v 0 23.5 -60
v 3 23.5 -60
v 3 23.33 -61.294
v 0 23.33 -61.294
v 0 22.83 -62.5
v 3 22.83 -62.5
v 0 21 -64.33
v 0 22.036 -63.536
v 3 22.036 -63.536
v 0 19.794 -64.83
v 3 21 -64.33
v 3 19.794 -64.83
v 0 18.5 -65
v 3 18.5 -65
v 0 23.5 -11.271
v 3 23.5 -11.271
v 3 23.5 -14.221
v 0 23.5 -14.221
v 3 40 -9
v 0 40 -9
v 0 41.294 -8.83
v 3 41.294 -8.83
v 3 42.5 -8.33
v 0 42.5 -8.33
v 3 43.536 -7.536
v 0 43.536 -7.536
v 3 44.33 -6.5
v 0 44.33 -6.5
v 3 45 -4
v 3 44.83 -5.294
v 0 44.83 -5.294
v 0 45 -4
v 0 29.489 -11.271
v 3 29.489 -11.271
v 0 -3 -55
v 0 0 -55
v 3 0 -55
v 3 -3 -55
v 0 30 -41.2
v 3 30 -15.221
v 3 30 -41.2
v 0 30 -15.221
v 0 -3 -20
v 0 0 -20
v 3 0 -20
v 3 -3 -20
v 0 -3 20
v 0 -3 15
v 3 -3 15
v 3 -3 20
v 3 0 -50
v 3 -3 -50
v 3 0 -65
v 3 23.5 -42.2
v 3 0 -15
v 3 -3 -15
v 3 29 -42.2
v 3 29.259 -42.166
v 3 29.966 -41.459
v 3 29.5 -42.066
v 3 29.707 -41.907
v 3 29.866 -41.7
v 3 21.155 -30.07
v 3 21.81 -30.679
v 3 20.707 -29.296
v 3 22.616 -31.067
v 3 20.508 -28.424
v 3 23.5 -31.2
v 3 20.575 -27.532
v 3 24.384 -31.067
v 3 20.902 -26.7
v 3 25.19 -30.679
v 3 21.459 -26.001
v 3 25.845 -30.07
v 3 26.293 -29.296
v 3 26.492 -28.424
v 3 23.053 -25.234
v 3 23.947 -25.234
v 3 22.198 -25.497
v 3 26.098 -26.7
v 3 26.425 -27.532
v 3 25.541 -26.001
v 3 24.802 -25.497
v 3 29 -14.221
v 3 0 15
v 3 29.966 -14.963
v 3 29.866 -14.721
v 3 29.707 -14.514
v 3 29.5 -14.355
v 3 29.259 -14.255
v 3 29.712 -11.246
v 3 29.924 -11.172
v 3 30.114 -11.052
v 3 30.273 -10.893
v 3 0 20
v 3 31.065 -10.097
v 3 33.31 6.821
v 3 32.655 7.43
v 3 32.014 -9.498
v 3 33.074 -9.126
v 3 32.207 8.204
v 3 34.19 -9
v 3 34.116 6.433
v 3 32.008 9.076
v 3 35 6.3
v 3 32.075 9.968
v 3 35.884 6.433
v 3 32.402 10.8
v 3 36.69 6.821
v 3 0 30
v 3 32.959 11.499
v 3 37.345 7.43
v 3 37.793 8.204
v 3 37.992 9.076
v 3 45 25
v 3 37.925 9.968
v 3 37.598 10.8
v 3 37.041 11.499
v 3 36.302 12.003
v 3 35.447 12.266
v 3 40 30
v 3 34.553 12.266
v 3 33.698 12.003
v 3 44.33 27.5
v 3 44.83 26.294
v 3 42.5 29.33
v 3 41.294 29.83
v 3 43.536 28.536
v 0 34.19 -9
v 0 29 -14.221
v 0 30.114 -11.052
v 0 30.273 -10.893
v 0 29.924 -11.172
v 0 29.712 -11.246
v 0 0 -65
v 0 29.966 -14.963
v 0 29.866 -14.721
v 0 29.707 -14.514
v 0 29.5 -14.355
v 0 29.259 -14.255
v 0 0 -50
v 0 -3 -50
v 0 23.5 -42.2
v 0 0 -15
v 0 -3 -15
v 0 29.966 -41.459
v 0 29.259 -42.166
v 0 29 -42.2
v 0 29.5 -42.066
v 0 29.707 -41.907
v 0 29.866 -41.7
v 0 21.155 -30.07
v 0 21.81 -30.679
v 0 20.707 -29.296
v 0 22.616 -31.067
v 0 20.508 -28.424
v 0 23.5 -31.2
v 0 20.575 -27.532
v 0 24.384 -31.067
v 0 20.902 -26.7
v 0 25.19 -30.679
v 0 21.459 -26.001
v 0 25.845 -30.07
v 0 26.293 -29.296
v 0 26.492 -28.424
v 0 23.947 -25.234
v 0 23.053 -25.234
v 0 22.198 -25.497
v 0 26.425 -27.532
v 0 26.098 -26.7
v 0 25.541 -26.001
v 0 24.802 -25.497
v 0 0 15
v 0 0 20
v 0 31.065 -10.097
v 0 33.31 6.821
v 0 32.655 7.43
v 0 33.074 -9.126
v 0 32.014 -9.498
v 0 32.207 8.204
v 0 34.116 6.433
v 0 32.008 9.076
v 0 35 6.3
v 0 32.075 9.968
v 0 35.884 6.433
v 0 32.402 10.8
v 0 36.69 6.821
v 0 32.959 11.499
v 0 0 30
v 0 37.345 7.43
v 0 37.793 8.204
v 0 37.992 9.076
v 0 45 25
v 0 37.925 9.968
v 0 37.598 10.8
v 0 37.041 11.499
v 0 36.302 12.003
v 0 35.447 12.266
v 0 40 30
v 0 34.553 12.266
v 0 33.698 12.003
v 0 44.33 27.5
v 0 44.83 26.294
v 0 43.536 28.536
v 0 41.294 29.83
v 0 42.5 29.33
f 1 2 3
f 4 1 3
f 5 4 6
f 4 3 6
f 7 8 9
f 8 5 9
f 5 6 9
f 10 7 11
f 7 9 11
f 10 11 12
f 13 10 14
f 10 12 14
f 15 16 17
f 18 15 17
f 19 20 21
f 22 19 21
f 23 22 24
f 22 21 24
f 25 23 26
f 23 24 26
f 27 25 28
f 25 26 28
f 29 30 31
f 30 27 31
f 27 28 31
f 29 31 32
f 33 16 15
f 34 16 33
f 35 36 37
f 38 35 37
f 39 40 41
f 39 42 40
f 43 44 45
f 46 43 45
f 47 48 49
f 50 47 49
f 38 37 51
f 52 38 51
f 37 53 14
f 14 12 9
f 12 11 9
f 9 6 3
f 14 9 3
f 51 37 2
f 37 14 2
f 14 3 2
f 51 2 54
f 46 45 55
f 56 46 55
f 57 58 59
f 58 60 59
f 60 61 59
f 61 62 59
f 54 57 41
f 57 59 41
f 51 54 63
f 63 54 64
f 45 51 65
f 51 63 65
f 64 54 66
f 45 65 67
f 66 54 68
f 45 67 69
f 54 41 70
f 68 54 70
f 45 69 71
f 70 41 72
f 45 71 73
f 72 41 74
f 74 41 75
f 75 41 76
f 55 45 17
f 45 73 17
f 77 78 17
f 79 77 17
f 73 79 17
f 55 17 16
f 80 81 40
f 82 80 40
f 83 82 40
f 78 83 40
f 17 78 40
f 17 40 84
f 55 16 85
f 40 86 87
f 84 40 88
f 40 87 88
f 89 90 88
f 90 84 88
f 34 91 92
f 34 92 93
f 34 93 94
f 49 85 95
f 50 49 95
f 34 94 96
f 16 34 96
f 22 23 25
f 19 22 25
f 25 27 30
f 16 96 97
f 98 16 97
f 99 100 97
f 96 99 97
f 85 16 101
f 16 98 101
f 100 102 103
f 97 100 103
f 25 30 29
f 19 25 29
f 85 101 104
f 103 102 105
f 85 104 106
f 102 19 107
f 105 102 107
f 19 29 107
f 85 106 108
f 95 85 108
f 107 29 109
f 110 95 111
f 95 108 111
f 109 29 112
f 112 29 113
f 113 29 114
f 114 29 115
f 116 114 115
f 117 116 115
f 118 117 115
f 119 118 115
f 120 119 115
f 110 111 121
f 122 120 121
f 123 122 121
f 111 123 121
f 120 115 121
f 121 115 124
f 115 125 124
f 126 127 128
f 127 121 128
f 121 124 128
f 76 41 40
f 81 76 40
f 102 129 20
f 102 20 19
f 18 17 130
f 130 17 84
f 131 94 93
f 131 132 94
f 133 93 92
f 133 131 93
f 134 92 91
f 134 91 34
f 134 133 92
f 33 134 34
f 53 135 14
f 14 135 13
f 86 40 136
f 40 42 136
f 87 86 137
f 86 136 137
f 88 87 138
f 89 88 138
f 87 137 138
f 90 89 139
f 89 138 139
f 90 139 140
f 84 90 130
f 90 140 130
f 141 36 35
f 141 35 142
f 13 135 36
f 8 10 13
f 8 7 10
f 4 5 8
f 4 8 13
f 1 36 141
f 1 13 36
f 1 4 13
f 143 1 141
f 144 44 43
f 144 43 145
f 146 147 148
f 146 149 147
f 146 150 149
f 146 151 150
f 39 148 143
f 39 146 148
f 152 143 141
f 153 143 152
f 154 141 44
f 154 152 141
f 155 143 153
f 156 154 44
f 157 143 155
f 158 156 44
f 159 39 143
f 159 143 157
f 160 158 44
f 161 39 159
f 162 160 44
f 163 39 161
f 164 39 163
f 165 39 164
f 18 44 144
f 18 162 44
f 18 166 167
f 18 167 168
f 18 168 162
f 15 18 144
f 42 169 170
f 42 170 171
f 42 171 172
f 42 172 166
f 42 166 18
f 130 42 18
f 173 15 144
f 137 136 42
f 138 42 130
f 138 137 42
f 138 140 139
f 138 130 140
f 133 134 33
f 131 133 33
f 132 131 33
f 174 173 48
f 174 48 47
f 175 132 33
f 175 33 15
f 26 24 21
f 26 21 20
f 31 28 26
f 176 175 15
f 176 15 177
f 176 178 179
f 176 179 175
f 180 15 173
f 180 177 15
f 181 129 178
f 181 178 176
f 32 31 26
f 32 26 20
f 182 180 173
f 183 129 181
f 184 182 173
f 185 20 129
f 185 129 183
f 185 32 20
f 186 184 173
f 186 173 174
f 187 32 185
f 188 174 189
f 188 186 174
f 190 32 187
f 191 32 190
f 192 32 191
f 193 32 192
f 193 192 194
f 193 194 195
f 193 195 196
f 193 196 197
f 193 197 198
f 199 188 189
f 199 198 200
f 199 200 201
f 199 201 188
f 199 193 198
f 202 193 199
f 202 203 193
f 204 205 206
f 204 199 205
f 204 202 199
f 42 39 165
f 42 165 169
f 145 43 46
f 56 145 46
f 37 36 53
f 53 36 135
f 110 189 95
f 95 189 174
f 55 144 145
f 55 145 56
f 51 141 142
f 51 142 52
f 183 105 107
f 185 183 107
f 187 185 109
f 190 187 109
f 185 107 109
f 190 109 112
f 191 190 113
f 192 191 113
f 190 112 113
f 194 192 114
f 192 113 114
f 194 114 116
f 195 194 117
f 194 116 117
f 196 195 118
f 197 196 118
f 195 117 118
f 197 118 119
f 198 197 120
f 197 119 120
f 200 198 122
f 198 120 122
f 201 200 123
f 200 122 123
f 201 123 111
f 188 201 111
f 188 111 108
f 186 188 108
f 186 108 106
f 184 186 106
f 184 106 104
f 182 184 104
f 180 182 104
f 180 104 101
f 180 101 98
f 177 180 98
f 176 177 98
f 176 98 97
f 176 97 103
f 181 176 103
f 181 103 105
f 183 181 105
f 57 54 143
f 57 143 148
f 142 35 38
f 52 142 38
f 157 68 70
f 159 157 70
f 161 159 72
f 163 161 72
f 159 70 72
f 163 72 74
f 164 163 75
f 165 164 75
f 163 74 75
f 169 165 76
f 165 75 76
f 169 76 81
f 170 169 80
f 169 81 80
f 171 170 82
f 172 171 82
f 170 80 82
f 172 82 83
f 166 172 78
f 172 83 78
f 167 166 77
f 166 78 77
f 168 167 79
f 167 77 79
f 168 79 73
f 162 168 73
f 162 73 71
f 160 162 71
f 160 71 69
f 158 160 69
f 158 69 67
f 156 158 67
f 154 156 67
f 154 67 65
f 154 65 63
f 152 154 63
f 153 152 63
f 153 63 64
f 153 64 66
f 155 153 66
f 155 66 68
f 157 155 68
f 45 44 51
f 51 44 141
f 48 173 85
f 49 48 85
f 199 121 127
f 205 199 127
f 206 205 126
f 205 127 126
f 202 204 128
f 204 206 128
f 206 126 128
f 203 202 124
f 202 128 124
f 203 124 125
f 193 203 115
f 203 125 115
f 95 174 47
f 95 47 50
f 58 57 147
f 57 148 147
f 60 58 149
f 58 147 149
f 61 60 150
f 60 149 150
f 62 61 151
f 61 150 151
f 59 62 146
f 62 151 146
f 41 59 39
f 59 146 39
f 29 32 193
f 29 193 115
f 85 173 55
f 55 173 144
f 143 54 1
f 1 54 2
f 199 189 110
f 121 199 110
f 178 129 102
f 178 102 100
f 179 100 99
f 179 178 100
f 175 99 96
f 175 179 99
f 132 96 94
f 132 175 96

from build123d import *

# Parameters (mm, degrees)
SKETCH1_W           = 95
SKETCH1_H           = 30
BOSS_EXTRUDE1_DEPTH = 3
SKETCH4_W           = 3
SKETCH4_H           = 5
BOSS_EXTRUDE2_DEPTH = 3
SKETCH5_W           = 3
SKETCH5_H           = 39
BOSS_EXTRUDE3_DEPTH = 15
SKETCH2_R           = 3
CUT_EXTRUDE1_DEPTH  = 80.113842025
LPATTERN1_COUNT     = 3
LPATTERN1_PITCH     = 35
SKETCH6_W           = 2.95
SKETCH6_H           = 8.706192548
SKETCH6_W_2         = 22.8
SKETCH6_H_2         = 6.5
CUT_EXTRUDE2_DEPTH  = 80.113842025
FILLET3_R           = 5
FILLET4_R           = 1


with BuildPart() as part:
    # Sketch1 → Boss-Extrude1 (new body)
    with BuildSketch(Plane(origin=(0, 0, 0), x_dir=(0, 0, -1), z_dir=(1, 0, 0))):
        with Locations((17.5, 15)):
            Rectangle(SKETCH1_W, SKETCH1_H)
    extrude(amount=BOSS_EXTRUDE1_DEPTH)

    # Sketch4 → Boss-Extrude2 (add)
    with BuildSketch(Plane(origin=(0, 0, 0), x_dir=(1, 0, 0), z_dir=(0, 1, 0))):
        with Locations((1.5, -17.5)):
            Rectangle(SKETCH4_W, SKETCH4_H)
    boss_extrude2 = extrude(amount=-BOSS_EXTRUDE2_DEPTH)

    # Sketch5 → Boss-Extrude3 (add)
    with BuildSketch(Plane(origin=(0, 30, 0), x_dir=(1, 0, 0), z_dir=(0, 1, 0))):
        with Locations((1.5, -10.5)):
            Rectangle(SKETCH5_W, SKETCH5_H)
    extrude(amount=BOSS_EXTRUDE3_DEPTH)

    # Sketch2 → Cut-Extrude1 (cut, through all)
    with BuildSketch(Plane(origin=(3, 0, 0), x_dir=(0, 0, -1), z_dir=(1, 0, 0))):
        with Locations((28.2, 23.5)):
            Circle(SKETCH2_R)
        with Locations((-9.3, 35)):
            Circle(SKETCH2_R)
    extrude(amount=-CUT_EXTRUDE1_DEPTH, mode=Mode.SUBTRACT)

    # LPattern1: Boss-Extrude2 ×3
    with Locations(*[(0, 0, -i * LPATTERN1_PITCH) for i in range(1, LPATTERN1_COUNT)]):
        add(boss_extrude2)

    # Sketch6 → Cut-Extrude2 (cut, through all)
    with BuildSketch(Plane(origin=(3, 0, 0), x_dir=(0, 0, -1), z_dir=(1, 0, 0))):
        with Locations((12.746364518, 27.853096274)):
            Rectangle(SKETCH6_W, SKETCH6_H)
        with Locations((53.6, 26.75)):
            Rectangle(SKETCH6_W_2, SKETCH6_H_2)
    extrude(amount=-CUT_EXTRUDE2_DEPTH, mode=Mode.SUBTRACT)

    # Fillet3
    # the kernel refuses this fillet: 5 mm, written as the material it adds along each edge
    with BuildSketch(Plane(origin=(0, 30, -9), x_dir=(0, 1.1824837095993706e-12, -1.0), z_dir=(1, 0, 0))) as fillet3_piece_1:
        with BuildLine():
            CenterArc((5, 4.189814842), FILLET3_R, 180, 56.925635132)
            Line((0, 4.189814842), (0, 0))
            Line((0, 0), (2.271364518, 0))
        make_face()
    extrude(amount=3)
    # the kernel refuses this fillet: 5 mm, written as the material it takes off along each edge
    with BuildSketch(Plane(origin=(15.5, 45, 30), x_dir=(0, 0, -1), z_dir=(-1, 0, 0)), Plane(origin=(15.5, 23.5, -65), x_dir=(0, -1, 0), z_dir=(-1, 0, 0))) as fillet3_2_piece_1:
        with BuildLine():
            CenterArc((FILLET3_R, FILLET3_R), FILLET3_R, 180, 90)
            Line((0, FILLET3_R), (0, 0))
            Line((0, 0), (FILLET3_R, 0))
        make_face()
    extrude(amount=28, mode=Mode.SUBTRACT)
    with BuildSketch(Plane(origin=(-12.5, 45, -9), x_dir=(0, -1, 0), z_dir=(1, 0, 0))) as fillet3_2_piece_2:
        with BuildLine():
            CenterArc((FILLET3_R, -FILLET3_R), FILLET3_R, 90, 90)
            Line((0, -FILLET3_R), (0, 0))
            Line((0, 0), (FILLET3_R, 0))
        make_face()
    extrude(amount=28, mode=Mode.SUBTRACT)

    # Fillet4
    fillet4_edges = [part.edges().sort_by_distance(p)[0] for p in [
        (1.5, 30, -11.271364518),
        (1.5, 30, -14.221364518),
        (1.5, 30, -42.2),
    ]]
    fillet(fillet4_edges, radius=FILLET4_R)


solid = part.part
